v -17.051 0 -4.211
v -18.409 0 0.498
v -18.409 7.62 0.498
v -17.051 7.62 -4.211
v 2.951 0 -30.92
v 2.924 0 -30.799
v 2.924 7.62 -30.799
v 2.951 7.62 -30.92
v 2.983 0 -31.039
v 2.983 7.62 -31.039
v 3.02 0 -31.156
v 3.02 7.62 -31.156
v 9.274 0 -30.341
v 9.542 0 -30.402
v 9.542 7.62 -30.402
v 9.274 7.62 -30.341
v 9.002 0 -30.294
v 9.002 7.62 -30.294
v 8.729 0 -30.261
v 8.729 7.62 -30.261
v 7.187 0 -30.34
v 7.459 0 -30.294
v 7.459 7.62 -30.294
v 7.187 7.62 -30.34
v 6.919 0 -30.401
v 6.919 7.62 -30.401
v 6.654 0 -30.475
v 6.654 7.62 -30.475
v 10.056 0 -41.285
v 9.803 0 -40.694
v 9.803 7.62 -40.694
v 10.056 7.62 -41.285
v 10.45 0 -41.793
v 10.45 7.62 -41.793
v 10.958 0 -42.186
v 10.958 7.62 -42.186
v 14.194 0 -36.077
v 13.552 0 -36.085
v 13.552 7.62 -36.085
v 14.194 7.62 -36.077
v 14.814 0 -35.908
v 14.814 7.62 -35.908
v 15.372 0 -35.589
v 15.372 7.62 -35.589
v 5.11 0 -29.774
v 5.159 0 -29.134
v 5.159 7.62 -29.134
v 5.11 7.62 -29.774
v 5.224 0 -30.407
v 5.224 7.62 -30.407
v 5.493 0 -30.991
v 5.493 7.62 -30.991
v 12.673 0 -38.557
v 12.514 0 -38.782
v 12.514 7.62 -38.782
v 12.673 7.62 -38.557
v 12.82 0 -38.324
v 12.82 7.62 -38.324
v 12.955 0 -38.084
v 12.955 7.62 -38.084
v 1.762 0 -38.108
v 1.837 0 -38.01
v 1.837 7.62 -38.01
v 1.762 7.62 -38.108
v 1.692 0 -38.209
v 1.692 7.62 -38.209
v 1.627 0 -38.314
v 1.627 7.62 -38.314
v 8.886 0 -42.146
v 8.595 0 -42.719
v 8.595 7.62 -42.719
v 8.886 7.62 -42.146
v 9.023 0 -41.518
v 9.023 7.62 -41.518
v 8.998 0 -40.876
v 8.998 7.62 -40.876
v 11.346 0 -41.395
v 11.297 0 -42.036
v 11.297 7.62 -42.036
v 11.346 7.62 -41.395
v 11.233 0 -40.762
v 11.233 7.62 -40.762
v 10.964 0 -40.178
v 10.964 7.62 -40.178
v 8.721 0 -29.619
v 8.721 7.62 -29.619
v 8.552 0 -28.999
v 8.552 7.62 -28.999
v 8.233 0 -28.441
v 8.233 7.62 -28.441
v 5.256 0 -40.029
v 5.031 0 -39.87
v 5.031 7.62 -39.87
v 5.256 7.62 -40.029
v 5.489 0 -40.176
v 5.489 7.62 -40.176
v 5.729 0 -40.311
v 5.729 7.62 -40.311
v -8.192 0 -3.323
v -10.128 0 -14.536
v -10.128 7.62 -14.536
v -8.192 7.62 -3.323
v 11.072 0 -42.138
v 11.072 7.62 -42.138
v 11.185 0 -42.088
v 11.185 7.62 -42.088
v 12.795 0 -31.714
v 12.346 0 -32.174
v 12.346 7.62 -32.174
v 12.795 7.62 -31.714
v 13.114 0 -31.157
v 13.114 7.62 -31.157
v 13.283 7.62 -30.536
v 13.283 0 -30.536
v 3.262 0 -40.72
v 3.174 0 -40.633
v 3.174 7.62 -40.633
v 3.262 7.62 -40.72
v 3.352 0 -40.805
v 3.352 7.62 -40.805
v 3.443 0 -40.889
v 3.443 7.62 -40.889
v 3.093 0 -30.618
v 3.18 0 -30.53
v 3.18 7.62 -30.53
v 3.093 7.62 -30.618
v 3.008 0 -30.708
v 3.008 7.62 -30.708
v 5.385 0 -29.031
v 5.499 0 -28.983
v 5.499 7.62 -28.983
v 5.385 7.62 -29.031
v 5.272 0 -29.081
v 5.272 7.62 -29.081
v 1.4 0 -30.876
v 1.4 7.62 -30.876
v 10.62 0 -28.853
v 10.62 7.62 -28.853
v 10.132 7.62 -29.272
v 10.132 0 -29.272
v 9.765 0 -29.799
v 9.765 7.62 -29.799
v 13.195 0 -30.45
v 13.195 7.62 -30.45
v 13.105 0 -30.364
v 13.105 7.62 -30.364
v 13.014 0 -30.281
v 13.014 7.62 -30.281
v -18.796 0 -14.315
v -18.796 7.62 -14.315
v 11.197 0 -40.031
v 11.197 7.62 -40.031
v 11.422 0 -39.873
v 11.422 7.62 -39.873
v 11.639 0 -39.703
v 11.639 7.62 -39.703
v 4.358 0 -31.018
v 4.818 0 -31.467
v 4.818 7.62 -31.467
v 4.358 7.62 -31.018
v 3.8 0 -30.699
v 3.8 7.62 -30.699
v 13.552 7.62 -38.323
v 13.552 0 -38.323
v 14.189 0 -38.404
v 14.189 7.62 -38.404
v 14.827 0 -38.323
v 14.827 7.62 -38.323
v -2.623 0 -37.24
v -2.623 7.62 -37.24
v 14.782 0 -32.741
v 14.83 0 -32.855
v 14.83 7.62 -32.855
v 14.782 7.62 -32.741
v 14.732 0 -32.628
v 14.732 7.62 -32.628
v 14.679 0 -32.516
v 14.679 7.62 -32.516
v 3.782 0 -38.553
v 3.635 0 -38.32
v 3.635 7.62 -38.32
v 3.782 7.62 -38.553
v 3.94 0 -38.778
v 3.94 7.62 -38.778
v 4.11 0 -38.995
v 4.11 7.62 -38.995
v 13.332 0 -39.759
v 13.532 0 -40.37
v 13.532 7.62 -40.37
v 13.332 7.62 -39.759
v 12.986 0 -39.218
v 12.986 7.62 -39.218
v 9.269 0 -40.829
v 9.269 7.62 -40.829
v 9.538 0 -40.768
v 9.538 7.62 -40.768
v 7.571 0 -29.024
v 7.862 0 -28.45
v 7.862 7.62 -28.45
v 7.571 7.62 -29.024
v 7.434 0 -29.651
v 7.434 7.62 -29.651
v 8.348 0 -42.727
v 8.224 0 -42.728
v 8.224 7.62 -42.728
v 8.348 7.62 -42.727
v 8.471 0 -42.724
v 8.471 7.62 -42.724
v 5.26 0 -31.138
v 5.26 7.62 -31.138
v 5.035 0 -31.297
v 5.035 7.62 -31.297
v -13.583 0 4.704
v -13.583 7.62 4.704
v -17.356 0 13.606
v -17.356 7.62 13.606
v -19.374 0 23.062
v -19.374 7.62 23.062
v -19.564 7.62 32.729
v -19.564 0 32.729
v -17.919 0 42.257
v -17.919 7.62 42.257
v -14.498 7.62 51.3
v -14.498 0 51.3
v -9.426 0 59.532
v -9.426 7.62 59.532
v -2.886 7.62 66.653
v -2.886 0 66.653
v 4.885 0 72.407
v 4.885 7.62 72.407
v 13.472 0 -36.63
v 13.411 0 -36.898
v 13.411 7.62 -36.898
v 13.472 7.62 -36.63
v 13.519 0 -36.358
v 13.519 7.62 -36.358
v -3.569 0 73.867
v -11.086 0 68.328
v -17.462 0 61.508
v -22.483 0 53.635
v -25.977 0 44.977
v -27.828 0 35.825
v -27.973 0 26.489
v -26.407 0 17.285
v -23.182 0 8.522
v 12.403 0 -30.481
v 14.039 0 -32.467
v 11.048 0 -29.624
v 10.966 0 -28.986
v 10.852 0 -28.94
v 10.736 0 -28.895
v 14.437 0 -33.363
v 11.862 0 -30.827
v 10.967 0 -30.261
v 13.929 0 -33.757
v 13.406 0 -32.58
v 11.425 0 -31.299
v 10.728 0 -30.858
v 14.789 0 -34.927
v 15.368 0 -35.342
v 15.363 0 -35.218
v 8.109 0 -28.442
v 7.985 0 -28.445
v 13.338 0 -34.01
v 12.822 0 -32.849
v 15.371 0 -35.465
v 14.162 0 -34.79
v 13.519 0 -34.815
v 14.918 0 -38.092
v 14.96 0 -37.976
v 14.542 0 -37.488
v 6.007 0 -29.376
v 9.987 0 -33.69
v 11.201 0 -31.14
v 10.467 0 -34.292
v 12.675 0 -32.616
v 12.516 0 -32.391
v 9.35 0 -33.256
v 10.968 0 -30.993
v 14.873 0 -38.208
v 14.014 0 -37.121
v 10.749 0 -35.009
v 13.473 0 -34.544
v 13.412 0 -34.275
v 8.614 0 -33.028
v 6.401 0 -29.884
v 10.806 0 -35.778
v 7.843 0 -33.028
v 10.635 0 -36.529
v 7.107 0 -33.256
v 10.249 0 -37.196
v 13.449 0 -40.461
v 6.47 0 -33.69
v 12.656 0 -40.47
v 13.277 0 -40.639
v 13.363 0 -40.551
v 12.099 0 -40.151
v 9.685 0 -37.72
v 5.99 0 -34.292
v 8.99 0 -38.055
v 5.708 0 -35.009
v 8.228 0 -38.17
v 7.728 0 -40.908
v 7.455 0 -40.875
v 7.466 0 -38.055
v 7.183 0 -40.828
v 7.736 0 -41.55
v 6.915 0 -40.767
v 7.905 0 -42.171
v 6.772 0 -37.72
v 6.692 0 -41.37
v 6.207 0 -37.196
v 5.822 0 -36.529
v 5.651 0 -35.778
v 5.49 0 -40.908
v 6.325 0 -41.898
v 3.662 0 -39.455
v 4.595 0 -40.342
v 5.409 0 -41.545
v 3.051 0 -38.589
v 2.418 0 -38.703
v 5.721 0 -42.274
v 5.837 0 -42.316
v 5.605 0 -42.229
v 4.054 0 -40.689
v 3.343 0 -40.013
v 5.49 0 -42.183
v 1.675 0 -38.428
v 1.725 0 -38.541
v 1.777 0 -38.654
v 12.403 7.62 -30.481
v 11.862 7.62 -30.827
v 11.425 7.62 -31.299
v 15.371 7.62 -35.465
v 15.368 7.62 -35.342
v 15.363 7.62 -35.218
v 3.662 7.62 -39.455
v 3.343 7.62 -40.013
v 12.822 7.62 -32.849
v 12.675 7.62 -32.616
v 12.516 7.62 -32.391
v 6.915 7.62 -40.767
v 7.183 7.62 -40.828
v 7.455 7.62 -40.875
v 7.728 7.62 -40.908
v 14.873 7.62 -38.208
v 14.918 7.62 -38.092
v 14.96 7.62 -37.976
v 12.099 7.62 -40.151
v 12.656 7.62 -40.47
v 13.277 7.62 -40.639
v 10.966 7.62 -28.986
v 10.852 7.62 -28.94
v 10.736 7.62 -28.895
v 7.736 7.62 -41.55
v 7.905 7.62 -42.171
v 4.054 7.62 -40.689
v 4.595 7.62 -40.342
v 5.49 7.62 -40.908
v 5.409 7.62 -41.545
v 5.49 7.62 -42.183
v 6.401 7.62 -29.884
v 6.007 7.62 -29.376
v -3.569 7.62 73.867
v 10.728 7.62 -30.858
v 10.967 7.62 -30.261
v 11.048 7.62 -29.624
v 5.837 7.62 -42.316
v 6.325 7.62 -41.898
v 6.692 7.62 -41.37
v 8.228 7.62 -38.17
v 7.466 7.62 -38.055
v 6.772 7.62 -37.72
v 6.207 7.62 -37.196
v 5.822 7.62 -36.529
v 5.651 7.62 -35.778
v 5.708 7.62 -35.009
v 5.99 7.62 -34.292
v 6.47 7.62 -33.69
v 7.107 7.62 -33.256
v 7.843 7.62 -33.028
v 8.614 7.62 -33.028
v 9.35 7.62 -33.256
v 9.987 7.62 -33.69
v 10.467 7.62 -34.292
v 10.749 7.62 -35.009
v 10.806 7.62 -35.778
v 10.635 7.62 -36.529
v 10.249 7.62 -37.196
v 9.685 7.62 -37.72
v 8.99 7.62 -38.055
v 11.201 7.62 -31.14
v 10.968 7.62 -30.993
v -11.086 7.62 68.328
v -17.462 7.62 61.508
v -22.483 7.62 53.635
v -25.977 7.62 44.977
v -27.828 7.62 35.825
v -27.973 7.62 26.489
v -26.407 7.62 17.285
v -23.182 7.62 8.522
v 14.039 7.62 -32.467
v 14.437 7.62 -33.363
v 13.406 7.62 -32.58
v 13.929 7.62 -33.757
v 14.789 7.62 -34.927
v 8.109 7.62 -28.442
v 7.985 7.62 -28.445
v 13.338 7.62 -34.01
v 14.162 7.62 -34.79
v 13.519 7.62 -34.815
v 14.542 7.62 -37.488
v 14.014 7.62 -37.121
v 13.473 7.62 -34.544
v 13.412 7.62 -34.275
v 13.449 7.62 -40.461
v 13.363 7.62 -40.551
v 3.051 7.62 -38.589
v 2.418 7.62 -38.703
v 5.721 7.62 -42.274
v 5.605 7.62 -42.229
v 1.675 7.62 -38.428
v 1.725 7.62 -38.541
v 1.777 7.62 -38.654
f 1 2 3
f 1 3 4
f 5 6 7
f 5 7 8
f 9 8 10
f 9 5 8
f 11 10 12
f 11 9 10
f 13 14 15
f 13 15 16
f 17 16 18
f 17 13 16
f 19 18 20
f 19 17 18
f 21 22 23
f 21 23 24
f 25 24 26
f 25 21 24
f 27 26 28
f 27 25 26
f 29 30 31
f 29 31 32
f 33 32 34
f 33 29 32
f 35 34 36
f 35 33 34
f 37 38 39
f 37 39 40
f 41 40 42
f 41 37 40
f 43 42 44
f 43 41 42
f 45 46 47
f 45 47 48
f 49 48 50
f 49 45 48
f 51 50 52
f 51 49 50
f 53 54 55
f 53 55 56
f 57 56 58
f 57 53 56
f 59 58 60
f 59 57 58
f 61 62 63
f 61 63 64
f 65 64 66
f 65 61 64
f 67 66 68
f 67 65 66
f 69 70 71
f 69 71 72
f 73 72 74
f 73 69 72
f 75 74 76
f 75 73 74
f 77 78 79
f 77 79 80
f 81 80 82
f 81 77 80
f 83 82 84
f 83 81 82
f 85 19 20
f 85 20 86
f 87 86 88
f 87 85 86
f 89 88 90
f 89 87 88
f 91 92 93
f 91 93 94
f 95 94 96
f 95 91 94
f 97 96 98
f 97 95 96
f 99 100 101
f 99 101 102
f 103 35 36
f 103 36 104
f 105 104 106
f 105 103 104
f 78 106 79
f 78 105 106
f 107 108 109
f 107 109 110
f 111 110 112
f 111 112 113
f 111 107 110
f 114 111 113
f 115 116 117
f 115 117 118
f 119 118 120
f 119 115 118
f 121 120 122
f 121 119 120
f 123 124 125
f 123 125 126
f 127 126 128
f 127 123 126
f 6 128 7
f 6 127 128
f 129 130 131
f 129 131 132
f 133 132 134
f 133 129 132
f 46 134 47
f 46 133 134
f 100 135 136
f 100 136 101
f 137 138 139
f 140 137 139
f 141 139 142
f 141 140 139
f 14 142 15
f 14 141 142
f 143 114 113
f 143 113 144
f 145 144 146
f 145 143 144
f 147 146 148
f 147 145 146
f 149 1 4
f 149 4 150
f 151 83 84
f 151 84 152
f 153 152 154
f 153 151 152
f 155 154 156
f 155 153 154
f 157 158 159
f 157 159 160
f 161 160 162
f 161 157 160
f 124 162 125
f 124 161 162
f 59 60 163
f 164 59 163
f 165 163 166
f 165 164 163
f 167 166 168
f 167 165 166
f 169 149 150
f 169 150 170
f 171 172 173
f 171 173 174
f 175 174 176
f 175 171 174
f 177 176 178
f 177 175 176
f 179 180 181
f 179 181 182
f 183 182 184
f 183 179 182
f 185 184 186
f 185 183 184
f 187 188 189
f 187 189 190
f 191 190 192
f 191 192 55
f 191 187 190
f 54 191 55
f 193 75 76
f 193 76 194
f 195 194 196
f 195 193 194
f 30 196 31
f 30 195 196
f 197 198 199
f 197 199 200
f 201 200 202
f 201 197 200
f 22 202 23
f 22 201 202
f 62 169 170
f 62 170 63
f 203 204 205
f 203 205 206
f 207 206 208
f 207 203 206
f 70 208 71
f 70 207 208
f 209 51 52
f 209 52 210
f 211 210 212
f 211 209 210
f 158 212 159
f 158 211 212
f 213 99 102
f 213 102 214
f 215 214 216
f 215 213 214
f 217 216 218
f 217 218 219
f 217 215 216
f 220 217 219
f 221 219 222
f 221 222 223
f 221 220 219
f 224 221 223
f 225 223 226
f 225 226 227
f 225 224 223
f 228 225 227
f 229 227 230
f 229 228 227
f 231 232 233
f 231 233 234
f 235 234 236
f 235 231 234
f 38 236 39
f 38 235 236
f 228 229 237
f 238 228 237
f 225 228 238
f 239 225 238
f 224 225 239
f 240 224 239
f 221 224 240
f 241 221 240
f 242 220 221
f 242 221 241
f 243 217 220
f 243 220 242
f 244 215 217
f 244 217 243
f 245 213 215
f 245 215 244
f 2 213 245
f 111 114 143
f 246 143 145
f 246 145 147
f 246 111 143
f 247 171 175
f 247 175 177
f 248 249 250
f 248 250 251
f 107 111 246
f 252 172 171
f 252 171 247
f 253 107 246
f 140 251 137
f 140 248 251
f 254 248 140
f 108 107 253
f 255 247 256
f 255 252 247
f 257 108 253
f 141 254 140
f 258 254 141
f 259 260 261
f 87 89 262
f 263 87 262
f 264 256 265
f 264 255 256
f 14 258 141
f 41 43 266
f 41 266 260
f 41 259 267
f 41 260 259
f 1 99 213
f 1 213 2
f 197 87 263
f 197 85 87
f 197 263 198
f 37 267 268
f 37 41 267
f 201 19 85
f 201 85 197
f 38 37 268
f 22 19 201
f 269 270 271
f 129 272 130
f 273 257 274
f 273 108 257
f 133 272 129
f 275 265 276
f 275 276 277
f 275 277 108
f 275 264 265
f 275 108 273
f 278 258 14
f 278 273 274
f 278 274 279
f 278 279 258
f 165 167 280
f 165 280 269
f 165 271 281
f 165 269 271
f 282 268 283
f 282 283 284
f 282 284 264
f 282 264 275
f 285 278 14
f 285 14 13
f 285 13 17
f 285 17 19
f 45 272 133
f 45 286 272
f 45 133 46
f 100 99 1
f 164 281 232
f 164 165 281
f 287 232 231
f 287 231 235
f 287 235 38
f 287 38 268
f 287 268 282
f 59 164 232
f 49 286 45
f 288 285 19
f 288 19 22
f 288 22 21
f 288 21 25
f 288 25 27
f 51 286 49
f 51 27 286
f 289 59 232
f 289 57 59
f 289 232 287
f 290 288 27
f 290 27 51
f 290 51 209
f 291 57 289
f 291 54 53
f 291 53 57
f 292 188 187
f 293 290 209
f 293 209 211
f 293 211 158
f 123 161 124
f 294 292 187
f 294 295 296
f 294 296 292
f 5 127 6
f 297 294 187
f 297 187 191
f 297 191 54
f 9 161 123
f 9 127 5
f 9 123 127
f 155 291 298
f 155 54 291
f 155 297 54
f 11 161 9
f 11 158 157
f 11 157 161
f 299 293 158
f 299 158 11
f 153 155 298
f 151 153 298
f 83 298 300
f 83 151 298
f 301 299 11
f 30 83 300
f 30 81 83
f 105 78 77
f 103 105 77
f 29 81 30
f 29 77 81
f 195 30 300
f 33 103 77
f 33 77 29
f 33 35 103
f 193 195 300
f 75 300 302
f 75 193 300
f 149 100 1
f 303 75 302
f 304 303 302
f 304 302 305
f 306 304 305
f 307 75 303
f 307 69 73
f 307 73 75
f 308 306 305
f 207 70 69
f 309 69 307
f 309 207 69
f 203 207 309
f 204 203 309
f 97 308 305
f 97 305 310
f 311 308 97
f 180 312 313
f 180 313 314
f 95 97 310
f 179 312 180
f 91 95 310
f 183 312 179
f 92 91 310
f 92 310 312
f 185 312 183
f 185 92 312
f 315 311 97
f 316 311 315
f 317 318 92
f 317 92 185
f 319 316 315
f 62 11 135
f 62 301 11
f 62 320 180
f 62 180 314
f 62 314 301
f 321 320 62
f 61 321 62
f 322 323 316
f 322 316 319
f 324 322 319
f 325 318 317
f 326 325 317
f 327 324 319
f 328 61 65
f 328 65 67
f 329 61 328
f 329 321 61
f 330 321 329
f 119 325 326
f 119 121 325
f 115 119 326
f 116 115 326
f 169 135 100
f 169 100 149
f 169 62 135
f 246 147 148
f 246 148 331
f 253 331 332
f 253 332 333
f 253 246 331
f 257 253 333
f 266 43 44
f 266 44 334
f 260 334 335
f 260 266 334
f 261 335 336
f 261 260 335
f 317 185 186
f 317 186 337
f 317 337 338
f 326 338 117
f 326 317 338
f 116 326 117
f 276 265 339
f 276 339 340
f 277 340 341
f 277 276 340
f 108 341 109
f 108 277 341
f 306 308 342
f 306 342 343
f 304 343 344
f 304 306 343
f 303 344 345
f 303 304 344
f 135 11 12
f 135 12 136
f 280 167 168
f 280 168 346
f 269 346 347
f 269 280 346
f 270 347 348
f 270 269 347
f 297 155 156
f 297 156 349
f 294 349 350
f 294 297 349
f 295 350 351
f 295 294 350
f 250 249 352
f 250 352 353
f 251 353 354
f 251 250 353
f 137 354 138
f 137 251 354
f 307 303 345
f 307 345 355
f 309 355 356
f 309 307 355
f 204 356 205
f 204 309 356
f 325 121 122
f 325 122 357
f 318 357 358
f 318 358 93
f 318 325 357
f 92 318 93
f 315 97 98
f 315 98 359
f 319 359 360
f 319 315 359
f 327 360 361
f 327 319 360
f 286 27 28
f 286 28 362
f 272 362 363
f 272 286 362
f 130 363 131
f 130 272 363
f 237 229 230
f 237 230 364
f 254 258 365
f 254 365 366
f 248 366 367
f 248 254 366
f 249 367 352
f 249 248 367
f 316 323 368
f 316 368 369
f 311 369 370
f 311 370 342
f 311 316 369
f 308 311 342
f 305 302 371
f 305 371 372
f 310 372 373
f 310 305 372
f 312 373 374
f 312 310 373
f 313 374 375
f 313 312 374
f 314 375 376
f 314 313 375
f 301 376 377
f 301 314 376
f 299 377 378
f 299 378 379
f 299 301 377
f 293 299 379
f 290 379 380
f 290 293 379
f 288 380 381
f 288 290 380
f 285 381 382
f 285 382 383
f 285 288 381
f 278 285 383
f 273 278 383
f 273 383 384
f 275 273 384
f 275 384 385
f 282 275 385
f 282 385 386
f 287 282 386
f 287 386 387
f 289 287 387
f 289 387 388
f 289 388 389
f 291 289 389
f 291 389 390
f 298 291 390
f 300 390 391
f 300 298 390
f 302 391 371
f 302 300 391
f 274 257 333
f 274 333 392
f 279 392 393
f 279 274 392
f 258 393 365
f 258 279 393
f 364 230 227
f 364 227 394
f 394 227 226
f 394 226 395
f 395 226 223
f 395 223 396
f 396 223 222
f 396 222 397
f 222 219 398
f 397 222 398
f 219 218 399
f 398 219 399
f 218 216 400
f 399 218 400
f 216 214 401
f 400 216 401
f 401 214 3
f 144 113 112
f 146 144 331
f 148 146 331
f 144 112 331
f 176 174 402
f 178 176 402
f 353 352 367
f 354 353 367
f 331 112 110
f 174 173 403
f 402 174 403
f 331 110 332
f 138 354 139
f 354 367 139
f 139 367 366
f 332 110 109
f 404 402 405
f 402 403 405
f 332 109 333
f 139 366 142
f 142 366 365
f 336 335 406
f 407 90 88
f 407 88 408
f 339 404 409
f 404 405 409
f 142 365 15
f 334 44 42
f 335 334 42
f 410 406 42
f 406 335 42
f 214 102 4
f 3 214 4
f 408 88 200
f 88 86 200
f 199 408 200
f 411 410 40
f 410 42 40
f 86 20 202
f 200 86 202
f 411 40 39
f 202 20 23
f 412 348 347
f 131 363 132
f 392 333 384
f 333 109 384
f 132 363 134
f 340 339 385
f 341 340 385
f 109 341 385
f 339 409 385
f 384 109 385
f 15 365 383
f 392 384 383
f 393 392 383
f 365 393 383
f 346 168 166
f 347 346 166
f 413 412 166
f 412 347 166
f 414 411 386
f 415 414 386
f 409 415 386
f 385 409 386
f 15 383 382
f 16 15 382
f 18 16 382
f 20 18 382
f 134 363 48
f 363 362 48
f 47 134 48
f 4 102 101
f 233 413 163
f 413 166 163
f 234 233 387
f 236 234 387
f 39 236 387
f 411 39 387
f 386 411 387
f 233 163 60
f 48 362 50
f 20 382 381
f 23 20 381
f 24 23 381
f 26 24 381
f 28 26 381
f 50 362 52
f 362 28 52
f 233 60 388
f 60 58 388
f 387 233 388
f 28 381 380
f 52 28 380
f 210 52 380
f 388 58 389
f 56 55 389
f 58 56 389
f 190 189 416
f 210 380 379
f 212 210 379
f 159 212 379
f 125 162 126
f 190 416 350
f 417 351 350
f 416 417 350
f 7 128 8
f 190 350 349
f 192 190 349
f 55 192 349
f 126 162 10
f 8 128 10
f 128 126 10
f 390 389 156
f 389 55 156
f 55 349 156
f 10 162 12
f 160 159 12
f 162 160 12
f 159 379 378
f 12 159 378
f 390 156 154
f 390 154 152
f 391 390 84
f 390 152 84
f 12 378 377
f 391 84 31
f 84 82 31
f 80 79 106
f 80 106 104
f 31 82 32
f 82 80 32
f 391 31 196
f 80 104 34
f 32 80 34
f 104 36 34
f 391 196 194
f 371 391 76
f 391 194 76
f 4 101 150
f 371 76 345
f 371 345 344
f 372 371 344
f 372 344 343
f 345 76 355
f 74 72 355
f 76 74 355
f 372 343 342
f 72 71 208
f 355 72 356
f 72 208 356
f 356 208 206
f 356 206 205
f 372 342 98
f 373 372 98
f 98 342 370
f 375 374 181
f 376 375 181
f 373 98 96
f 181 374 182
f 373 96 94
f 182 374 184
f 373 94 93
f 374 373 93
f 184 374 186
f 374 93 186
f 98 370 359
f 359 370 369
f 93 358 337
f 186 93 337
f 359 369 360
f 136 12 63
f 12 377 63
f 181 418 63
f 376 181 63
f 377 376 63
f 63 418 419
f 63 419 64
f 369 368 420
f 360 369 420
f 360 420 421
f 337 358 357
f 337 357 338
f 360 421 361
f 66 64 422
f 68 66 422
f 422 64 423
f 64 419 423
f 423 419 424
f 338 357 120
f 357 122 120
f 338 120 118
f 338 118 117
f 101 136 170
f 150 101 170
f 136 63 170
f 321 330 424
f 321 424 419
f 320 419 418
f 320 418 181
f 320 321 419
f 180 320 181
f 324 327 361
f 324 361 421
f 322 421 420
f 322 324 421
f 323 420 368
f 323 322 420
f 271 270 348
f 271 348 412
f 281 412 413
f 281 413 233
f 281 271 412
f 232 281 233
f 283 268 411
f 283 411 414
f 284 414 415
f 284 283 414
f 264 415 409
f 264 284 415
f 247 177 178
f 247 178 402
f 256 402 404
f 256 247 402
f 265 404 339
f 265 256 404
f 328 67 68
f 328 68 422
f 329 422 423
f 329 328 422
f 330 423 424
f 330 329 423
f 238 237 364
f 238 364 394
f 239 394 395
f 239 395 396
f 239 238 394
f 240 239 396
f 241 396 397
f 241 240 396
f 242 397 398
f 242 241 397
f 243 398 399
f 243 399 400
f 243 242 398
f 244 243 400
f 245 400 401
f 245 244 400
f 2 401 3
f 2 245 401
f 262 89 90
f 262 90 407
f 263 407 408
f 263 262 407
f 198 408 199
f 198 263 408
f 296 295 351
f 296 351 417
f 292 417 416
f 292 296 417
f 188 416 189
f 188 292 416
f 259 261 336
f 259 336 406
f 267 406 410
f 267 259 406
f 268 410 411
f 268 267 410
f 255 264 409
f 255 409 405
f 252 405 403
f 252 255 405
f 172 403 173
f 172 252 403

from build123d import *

# Parameters (mm, degrees)
SKETCH1_R           = 2.585044133
BOSS_EXTRUDE1_DEPTH = 7.62


with BuildPart() as part:
    # Sketch1 → Boss-Extrude1 (new body)
    with BuildSketch(Plane(origin=(0, 0, 0), x_dir=(1, 0, 0), z_dir=(0, 1, 0))):
        with BuildLine():
            Line((3.020276381, 31.156144465), (1.399779997, 30.876318364))
            Line((1.399779997, 30.876318364), (-10.128325028, 14.535897116))
            Line((-10.128325028, 14.535897116), (-8.192029601, 3.322648137))
            ThreePointArc((-8.192029601, 3.322648137), (-18.968565906, -37.532030496), (4.88487987, -72.406829787))
            Line((4.88487987, -72.406829787), (-3.568924444, -73.866626378))
            ThreePointArc((-3.568924444, -73.866626378), (-27.113440564, -40.443559332), (-18.408519275, -0.497721057))
            Line((-18.408519275, -0.497721057), (-17.051314308, 4.21102278))
            Line((-17.051314308, 4.21102278), (-18.796078997, 14.315101218))
            Line((-18.796078997, 14.315101218), (-2.622690692, 37.239942495))
            Line((-2.622690692, 37.239942495), (1.836758298, 38.009996803))
            ThreePointArc((1.836758298, 38.009996803), (1.726185886, 38.158240643), (1.62669315, 38.31413705))
            ThreePointArc((1.62669315, 38.31413705), (1.699886001, 38.484843232), (1.777492058, 38.653588881))
            ThreePointArc((1.777492058, 38.653588881), (2.738177728, 38.665878668), (3.634702712, 38.320464496))
            ThreePointArc((3.634702712, 38.320464496), (3.859539856, 38.666818829), (4.110435884, 38.994788717))
            ThreePointArc((4.110435884, 38.994788717), (3.484366991, 39.723558733), (3.173770753, 40.632733069))
            ThreePointArc((3.173770753, 40.632733069), (3.306718558, 40.762435326), (3.44299337, 40.888637424))
            ThreePointArc((3.44299337, 40.888637424), (4.335254295, 40.532353217), (5.031351097, 39.870146876))
            ThreePointArc((5.031351097, 39.870146876), (5.371617597, 40.104095105), (5.728923946, 40.311086019))
            ThreePointArc((5.728923946, 40.311086019), (5.42939992, 41.223967914), (5.490372369, 42.182795508))
            ThreePointArc((5.490372369, 42.182795508), (5.662835029, 42.251747846), (5.837031991, 42.316193269))
            ThreePointArc((5.837031991, 42.316193269), (6.525029535, 41.645576109), (6.914723727, 40.767392511))
            ThreePointArc((6.914723727, 40.767392511), (7.318617093, 40.853318139), (7.727937109, 40.907817588))
            ThreePointArc((7.727937109, 40.907817588), (7.800557769, 41.865833368), (8.223816402, 42.728341412))
            ThreePointArc((8.223816402, 42.728341412), (8.409538041, 42.726046463), (8.595137244, 42.718923979))
            ThreePointArc((8.595137244, 42.718923979), (8.974130017, 41.836069249), (8.998094191, 40.875603886))
            ThreePointArc((8.998094191, 40.875603886), (9.40412532, 40.800425515), (9.803143741, 40.694136452))
            ThreePointArc((9.803143741, 40.694136452), (10.236853249, 41.5514369), (10.957960776, 42.186316362))
            ThreePointArc((10.957960776, 42.186316362), (11.128666958, 42.113123511), (11.297412607, 42.035517454))
            ThreePointArc((11.297412607, 42.035517454), (11.309702393, 41.074831784), (10.964288222, 40.1783068))
            ThreePointArc((10.964288222, 40.1783068), (11.310642554, 39.953469656), (11.638612443, 39.702573628))
            ThreePointArc((11.638612443, 39.702573628), (12.367382459, 40.328642521), (13.276556795, 40.639238759))
            ThreePointArc((13.276556795, 40.639238759), (13.406259052, 40.506290954), (13.53246115, 40.370016142))
            ThreePointArc((13.53246115, 40.370016142), (13.176176943, 39.477755216), (12.513970602, 38.781658415))
            ThreePointArc((12.513970602, 38.781658415), (12.747918831, 38.441391914), (12.954909744, 38.084085566))
            ThreePointArc((12.954909744, 38.084085566), (13.867791639, 38.383609592), (14.826619234, 38.322637143))
            ThreePointArc((14.826619234, 38.322637143), (14.895571572, 38.150174482), (14.960016995, 37.975977521))
            ThreePointArc((14.960016995, 37.975977521), (14.289399835, 37.287979977), (13.411216236, 36.898285785))
            ThreePointArc((13.411216236, 36.898285785), (13.497141864, 36.494392418), (13.551641313, 36.085072403))
            ThreePointArc((13.551641313, 36.085072403), (14.509657094, 36.012451743), (15.372165138, 35.58919311))
            ThreePointArc((15.372165138, 35.58919311), (15.369870189, 35.403471471), (15.362747705, 35.217872267))
            ThreePointArc((15.362747705, 35.217872267), (14.479892975, 34.838879495), (13.519427611, 34.814915321))
            ThreePointArc((13.519427611, 34.814915321), (13.444249241, 34.408884192), (13.337960178, 34.009865771))
            ThreePointArc((13.337960178, 34.009865771), (14.195260626, 33.576156263), (14.830140088, 32.855048736))
            ThreePointArc((14.830140088, 32.855048736), (14.756947237, 32.684342554), (14.67934118, 32.515596905))
            ThreePointArc((14.67934118, 32.515596905), (13.718655509, 32.503307119), (12.822130526, 32.84872129))
            ThreePointArc((12.822130526, 32.84872129), (12.597293382, 32.502366958), (12.346397354, 32.174397069))
            ThreePointArc((12.346397354, 32.174397069), (12.972466247, 31.445627053), (13.283062484, 30.536452717))
            ThreePointArc((13.283062484, 30.536452717), (13.15011468, 30.40675046), (13.013839868, 30.280548362))
            ThreePointArc((13.013839868, 30.280548362), (12.121578942, 30.636832569), (11.42548214, 31.29903891))
            ThreePointArc((11.42548214, 31.29903891), (11.08521564, 31.065090681), (10.727909292, 30.858099767))
            ThreePointArc((10.727909292, 30.858099767), (11.027433317, 29.945217873), (10.966460868, 28.986390278))
            ThreePointArc((10.966460868, 28.986390278), (10.793998208, 28.91743794), (10.619801246, 28.852992517))
            ThreePointArc((10.619801246, 28.852992517), (9.931803703, 29.523609677), (9.54210951, 30.401793275))
            ThreePointArc((9.54210951, 30.401793275), (9.138216144, 30.315867647), (8.728896129, 30.261368198))
            ThreePointArc((8.728896129, 30.261368198), (8.656275469, 29.303352418), (8.233016836, 28.440844374))
            ThreePointArc((8.233016836, 28.440844374), (8.047295197, 28.443139323), (7.861695993, 28.450261807))
            ThreePointArc((7.861695993, 28.450261807), (7.482703221, 29.333116537), (7.458739046, 30.2935819))
            ThreePointArc((7.458739046, 30.2935819), (7.052707918, 30.368760271), (6.653689497, 30.475049334))
            ThreePointArc((6.653689497, 30.475049334), (6.219979988, 29.617748886), (5.498872462, 28.982869424))
            ThreePointArc((5.498872462, 28.982869424), (5.32816628, 29.056062275), (5.159420631, 29.133668332))
            ThreePointArc((5.159420631, 29.133668332), (5.147130844, 30.094354002), (5.492545016, 30.990878986))
            ThreePointArc((5.492545016, 30.990878986), (5.146190683, 31.21571613), (4.818220795, 31.466612158))
            ThreePointArc((4.818220795, 31.466612158), (4.089450779, 30.840543265), (3.180276443, 30.529947028))
            ThreePointArc((3.180276443, 30.529947028), (3.050574186, 30.662894832), (2.924372087, 30.799169644))
            ThreePointArc((2.924372087, 30.799169644), (2.965822028, 30.979403927), (3.020276381, 31.156144465))
        make_face()
        with Locations(Location((8.228416619, 35.584592893, 0), (0, 0, 90))):
            Circle(SKETCH1_R, mode=Mode.SUBTRACT)
    extrude(amount=BOSS_EXTRUDE1_DEPTH)


solid = part.part
